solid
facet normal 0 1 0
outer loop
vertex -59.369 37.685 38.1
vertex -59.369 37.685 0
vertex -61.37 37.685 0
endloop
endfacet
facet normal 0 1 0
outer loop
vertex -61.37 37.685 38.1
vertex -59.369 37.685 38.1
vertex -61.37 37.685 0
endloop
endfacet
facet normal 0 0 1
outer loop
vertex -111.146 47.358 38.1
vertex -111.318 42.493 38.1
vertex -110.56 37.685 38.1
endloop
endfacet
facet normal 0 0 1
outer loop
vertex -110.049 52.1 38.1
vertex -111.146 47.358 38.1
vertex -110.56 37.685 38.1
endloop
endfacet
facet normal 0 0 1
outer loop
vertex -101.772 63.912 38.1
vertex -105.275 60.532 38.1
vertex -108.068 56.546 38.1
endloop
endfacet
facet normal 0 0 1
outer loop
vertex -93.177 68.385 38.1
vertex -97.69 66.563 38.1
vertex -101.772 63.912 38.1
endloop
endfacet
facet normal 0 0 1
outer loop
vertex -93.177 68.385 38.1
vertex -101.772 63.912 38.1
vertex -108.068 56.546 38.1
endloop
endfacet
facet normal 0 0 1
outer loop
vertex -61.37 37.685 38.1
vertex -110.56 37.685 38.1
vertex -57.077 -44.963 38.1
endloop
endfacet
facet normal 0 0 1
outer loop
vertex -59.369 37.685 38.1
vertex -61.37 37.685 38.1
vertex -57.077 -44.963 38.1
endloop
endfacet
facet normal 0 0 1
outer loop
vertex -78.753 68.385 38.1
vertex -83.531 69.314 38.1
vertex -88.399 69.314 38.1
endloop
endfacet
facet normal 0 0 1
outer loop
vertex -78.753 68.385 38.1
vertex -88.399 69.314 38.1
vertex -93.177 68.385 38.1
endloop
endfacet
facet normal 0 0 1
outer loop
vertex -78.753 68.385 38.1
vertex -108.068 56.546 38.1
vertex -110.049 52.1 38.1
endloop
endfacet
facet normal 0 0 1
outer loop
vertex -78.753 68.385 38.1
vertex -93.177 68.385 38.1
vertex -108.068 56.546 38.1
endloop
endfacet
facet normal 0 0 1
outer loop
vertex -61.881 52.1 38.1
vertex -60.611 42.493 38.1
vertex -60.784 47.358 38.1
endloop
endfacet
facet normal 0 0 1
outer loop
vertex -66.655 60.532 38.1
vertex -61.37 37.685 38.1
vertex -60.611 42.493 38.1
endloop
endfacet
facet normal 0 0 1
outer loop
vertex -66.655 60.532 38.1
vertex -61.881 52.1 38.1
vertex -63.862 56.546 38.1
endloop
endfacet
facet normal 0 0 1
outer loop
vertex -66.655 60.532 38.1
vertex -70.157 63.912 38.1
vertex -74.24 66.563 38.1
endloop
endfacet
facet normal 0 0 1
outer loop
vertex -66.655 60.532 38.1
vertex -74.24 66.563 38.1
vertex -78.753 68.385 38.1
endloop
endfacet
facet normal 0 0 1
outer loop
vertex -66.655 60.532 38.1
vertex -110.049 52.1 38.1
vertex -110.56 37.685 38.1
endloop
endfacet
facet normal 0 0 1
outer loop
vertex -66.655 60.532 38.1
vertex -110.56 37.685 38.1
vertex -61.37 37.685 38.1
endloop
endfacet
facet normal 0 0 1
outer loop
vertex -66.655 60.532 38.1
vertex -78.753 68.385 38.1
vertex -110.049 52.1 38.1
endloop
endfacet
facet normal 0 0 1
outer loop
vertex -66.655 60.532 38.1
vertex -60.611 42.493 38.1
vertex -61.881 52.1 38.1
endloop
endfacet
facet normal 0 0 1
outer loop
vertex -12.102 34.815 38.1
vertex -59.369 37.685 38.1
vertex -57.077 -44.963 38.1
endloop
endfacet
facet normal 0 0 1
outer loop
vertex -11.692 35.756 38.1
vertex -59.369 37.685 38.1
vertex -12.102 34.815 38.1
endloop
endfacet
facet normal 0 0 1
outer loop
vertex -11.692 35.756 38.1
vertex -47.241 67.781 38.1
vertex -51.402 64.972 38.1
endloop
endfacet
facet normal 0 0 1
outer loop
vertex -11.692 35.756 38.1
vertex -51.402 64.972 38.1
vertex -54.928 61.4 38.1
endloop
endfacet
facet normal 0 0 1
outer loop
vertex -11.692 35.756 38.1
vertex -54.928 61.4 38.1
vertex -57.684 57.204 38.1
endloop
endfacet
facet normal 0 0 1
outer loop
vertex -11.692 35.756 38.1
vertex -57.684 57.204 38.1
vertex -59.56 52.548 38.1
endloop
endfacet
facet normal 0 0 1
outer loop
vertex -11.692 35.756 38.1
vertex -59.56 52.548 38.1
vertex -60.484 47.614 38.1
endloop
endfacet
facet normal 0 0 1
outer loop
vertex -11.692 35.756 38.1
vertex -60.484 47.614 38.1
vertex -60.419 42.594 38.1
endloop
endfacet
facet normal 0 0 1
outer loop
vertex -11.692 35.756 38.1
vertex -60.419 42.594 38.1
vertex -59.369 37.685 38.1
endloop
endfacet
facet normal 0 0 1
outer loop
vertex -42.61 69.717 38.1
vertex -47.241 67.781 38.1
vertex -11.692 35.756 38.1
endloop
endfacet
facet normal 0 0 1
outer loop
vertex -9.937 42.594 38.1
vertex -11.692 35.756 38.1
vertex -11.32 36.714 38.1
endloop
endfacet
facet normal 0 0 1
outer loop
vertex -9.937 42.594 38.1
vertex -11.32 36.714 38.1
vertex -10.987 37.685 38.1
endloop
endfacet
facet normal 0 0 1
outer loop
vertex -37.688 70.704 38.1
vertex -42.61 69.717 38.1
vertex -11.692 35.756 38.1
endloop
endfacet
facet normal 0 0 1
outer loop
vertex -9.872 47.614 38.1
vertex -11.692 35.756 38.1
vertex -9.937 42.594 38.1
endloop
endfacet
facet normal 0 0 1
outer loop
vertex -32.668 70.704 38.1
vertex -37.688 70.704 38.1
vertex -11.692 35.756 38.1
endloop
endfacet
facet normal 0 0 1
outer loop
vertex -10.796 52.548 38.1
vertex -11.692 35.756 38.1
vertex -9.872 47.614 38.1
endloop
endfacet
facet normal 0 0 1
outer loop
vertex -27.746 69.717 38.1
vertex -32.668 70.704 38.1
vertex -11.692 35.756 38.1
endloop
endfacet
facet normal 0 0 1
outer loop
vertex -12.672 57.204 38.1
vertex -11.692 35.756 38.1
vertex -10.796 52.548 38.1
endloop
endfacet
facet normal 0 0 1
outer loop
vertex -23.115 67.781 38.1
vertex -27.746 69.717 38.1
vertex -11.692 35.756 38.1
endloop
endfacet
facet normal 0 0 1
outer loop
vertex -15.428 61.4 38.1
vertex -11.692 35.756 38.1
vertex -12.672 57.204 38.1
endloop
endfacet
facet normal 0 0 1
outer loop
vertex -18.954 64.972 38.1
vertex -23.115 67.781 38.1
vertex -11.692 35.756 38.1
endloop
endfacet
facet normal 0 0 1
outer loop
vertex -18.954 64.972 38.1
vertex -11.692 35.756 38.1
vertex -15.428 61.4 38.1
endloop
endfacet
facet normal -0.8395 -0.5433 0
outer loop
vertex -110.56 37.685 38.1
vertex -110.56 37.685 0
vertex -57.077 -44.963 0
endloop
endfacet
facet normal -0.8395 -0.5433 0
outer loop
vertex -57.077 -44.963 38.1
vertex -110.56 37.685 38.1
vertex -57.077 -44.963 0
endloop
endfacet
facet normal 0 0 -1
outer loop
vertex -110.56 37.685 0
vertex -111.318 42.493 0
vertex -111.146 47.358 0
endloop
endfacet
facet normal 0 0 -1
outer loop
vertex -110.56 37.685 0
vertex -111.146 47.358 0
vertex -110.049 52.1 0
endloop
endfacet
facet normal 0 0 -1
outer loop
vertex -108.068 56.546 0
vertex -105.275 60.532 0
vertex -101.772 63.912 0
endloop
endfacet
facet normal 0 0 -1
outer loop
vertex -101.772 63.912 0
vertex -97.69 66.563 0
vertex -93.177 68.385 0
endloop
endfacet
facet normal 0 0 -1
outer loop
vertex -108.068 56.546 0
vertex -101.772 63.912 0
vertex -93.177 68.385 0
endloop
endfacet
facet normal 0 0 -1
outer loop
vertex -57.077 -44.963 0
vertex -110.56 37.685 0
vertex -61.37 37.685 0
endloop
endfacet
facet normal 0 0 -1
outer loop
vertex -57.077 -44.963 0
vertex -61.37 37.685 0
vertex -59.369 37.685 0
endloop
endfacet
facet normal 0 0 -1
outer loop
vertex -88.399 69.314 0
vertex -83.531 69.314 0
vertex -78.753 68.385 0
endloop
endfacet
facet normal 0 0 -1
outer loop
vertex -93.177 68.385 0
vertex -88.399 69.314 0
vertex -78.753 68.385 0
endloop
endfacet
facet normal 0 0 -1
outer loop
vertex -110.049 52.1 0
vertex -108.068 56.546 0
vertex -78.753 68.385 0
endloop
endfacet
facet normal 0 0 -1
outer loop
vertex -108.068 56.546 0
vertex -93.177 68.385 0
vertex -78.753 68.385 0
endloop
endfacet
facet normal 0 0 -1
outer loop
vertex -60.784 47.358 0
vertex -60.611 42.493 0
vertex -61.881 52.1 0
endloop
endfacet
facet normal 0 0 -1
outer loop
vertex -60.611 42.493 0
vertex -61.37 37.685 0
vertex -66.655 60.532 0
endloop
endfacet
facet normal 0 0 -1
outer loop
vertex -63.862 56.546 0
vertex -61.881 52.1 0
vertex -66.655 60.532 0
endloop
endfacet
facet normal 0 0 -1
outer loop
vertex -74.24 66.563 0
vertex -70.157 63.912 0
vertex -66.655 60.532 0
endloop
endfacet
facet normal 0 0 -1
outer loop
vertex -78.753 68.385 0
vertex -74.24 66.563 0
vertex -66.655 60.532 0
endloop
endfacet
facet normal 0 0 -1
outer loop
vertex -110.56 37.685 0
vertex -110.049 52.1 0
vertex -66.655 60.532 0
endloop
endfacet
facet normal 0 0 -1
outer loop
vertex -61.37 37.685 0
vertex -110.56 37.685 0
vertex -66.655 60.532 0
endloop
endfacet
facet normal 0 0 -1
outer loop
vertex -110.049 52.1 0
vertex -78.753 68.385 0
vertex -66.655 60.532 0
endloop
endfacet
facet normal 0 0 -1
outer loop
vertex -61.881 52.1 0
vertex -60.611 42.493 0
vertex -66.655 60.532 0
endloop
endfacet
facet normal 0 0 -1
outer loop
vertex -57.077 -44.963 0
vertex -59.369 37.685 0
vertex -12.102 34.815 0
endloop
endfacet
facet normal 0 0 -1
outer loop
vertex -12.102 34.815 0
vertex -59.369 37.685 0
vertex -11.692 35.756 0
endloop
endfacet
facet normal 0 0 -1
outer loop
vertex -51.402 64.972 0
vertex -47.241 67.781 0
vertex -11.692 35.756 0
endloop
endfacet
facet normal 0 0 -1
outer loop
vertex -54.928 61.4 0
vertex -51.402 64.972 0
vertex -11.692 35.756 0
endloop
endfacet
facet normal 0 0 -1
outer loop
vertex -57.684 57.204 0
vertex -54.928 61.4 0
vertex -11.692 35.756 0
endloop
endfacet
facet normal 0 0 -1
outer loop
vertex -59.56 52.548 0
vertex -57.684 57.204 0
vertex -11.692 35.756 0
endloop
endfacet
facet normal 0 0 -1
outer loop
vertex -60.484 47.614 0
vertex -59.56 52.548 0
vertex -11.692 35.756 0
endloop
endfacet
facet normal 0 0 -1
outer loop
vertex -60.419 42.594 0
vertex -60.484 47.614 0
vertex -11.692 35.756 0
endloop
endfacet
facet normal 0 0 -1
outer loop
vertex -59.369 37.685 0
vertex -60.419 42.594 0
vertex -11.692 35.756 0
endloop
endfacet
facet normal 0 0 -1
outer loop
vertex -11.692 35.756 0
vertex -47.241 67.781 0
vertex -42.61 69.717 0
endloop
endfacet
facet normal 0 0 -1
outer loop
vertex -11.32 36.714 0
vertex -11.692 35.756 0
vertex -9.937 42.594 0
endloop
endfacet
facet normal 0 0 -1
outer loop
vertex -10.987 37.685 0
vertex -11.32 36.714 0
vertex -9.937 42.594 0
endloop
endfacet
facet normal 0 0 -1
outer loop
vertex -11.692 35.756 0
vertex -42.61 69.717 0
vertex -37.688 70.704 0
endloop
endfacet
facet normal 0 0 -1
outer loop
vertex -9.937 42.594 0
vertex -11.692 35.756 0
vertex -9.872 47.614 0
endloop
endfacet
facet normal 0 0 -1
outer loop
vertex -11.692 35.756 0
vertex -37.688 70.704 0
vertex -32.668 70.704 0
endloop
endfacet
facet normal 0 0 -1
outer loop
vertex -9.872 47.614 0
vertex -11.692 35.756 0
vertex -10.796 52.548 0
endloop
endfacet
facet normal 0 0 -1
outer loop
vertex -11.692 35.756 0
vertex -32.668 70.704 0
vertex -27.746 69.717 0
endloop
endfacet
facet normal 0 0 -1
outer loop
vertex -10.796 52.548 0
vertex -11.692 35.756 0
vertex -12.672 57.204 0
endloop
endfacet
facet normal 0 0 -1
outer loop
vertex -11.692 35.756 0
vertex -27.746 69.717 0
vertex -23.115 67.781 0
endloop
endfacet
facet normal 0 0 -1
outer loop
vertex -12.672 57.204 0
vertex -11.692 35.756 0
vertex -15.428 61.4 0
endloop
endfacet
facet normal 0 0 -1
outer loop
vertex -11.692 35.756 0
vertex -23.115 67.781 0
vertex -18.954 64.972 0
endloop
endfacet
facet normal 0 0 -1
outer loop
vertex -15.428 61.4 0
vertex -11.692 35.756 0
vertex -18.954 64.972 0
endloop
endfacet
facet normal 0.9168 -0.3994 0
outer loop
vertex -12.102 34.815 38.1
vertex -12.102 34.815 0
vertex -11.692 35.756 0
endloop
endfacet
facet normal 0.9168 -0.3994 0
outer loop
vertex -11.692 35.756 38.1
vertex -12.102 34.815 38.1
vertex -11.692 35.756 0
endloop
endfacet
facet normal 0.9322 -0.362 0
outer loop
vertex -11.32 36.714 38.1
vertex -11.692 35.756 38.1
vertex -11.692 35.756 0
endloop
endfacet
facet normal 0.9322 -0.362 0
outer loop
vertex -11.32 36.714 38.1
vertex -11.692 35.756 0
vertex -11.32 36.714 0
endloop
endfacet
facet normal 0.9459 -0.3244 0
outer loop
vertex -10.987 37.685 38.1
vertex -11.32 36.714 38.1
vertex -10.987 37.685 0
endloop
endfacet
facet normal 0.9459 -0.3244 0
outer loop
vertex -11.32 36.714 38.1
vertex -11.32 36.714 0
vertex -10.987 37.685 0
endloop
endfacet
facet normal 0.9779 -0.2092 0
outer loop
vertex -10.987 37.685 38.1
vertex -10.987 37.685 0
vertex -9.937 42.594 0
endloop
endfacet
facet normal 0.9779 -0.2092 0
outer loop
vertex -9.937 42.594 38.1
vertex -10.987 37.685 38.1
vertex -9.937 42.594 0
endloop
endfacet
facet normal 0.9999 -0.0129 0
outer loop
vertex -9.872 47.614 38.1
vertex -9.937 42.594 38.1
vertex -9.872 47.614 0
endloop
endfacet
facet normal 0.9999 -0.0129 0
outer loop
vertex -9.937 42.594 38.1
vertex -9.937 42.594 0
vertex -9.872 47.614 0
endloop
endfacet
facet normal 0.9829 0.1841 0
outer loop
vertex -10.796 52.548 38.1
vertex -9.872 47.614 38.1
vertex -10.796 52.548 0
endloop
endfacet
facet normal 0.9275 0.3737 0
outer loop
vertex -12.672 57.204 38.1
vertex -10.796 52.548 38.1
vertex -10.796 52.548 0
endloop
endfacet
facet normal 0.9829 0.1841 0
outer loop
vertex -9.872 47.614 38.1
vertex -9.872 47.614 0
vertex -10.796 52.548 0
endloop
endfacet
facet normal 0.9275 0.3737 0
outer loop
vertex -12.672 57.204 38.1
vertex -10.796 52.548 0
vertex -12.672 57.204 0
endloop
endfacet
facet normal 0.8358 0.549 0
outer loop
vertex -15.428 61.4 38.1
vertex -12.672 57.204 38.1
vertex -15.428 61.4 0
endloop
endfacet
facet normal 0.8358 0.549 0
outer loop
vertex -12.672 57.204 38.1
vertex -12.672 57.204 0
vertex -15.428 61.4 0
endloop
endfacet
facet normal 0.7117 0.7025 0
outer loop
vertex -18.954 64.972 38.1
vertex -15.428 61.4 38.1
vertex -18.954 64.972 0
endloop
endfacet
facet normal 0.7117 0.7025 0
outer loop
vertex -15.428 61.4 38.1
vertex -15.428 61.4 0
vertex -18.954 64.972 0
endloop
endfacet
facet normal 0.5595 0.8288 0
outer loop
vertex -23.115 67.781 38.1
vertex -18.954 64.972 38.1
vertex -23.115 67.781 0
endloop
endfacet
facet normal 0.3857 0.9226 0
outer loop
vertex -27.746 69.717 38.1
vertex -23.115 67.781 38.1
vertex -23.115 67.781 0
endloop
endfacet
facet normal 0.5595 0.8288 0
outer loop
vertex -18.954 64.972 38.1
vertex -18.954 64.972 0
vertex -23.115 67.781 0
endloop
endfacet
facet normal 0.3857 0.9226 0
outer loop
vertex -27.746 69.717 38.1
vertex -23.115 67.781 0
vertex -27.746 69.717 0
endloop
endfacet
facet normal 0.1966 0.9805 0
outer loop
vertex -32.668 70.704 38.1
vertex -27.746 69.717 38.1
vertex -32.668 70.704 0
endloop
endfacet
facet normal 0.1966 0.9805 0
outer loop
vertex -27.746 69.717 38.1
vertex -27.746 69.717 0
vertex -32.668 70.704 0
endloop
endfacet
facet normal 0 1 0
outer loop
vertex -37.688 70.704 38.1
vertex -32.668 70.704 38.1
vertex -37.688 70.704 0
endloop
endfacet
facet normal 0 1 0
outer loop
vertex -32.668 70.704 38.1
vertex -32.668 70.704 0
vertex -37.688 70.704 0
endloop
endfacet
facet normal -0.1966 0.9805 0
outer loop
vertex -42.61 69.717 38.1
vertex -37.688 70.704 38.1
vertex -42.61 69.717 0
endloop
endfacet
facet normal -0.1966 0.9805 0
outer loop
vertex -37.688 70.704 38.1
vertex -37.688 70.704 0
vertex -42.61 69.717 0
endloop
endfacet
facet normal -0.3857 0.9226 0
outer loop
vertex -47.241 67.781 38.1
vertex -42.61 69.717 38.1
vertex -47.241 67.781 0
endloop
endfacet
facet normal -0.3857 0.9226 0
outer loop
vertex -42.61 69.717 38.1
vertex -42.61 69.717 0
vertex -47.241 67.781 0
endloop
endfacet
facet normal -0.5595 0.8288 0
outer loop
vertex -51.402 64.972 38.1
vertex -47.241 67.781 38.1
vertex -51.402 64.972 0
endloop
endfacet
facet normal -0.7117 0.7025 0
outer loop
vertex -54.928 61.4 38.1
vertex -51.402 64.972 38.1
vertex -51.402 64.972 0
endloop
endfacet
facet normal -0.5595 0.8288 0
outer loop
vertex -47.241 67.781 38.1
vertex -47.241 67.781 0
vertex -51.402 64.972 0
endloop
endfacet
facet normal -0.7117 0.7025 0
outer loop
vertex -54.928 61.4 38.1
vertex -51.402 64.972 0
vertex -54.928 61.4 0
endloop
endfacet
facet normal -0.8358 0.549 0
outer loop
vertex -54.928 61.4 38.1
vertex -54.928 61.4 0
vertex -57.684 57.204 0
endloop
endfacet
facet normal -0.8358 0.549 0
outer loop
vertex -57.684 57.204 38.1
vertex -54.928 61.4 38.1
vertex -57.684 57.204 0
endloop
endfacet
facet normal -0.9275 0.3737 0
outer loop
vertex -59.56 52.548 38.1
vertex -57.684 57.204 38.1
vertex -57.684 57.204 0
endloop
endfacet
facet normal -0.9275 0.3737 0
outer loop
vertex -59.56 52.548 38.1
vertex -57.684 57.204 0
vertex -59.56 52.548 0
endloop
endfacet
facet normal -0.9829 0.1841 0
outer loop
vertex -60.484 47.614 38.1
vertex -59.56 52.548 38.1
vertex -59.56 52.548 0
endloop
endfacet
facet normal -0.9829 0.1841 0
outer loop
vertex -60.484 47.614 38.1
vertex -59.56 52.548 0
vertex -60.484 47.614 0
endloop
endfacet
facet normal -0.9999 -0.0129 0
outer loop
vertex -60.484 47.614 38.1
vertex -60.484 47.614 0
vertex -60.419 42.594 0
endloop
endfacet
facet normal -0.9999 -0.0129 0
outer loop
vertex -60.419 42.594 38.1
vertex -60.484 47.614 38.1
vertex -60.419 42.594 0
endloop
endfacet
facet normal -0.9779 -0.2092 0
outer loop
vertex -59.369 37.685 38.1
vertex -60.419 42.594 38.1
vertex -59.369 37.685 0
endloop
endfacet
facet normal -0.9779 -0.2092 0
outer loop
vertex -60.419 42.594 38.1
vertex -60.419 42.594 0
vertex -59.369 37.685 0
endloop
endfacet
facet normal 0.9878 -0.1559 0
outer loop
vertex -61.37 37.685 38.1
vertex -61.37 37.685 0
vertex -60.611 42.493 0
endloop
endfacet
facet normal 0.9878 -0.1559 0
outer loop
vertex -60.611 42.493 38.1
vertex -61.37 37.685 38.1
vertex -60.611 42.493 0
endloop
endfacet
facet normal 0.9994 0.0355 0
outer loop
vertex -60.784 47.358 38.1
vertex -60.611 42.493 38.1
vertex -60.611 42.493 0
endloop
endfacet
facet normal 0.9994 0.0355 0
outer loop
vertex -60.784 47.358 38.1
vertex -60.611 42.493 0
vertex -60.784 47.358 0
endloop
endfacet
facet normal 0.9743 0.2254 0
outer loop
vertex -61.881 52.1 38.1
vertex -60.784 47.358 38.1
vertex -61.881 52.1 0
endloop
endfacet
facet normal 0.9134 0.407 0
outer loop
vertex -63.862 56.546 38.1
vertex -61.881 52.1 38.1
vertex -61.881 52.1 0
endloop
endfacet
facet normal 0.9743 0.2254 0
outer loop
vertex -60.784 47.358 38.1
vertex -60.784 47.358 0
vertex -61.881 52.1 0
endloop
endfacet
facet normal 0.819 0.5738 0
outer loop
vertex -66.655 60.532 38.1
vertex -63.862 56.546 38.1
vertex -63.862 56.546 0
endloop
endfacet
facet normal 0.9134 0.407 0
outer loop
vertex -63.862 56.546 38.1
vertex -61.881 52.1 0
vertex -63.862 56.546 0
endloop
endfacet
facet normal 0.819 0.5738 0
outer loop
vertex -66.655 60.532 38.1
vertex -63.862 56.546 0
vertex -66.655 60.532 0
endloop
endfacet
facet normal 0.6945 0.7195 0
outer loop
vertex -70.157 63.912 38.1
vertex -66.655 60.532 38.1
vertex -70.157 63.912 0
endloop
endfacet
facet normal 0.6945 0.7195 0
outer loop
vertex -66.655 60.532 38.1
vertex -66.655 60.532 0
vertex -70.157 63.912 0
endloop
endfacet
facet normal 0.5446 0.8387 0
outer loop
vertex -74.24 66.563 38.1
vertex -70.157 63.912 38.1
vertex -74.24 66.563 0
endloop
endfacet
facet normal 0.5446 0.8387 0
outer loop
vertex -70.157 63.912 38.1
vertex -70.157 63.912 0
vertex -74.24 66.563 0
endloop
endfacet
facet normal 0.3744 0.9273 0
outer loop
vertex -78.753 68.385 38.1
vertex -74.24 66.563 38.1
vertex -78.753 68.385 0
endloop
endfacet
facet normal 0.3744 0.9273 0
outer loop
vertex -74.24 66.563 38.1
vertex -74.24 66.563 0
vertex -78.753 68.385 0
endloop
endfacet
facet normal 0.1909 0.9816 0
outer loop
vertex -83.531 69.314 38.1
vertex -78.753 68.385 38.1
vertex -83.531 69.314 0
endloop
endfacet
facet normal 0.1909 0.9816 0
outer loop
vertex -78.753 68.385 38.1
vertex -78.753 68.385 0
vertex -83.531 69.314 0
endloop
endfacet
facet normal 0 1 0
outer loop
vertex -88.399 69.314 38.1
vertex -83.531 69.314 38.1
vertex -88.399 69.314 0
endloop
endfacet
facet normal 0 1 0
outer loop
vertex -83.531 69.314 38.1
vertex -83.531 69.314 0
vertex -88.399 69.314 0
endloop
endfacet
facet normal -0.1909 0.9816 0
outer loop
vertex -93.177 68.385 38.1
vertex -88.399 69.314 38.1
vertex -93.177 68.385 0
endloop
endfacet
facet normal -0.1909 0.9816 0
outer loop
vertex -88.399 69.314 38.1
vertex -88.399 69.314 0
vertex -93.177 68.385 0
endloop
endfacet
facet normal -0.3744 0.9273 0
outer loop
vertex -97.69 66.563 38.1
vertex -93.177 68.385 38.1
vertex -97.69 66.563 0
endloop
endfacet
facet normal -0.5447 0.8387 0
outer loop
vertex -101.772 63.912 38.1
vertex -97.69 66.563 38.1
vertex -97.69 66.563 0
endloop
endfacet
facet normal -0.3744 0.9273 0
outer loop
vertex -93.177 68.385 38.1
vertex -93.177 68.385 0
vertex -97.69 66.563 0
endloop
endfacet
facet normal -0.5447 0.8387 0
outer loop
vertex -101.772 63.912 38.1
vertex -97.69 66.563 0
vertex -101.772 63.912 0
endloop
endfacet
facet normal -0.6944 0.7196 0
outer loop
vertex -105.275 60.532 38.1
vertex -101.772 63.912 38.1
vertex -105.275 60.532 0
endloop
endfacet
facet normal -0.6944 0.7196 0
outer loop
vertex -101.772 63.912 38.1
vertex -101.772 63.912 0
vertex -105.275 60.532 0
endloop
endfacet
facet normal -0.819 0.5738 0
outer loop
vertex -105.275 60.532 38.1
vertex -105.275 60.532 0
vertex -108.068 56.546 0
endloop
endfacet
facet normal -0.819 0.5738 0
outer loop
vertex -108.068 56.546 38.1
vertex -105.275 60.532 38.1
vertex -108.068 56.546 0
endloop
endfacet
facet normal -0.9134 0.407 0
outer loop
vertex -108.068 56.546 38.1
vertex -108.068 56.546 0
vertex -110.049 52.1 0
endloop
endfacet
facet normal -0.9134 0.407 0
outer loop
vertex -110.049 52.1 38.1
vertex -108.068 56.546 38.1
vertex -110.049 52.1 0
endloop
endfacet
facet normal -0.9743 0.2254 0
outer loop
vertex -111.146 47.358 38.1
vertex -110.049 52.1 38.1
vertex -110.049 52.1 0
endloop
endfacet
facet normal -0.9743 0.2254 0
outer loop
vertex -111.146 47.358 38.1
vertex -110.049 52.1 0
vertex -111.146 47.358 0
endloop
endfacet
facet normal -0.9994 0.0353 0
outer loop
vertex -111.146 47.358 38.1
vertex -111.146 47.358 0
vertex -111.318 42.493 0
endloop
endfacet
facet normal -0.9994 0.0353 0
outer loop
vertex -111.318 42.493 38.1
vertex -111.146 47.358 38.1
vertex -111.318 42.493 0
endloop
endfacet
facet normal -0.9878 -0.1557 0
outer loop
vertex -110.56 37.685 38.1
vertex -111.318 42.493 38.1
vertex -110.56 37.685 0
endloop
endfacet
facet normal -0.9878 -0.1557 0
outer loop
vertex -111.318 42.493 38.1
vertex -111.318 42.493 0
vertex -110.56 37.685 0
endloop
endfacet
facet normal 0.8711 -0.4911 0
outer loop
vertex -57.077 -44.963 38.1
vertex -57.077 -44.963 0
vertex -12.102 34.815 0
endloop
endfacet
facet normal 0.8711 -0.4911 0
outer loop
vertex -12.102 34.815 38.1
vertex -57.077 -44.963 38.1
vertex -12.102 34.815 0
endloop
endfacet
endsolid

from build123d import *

# Parameters (mm, degrees)
F1_DEPTH = 38.1


with BuildPart() as f1:
    # F0 (on Top) → F1 (new body)
    with BuildSketch(Plane.XY):
        with BuildLine():
            Line((-59.369042, 37.685493), (-61.37024, 37.685493))
            ThreePointArc((-61.37024, 37.685493), (-85.964896, 69.4308), (-110.559551, 37.685493))
            Line((-110.559551, 37.685493), (-57.076961, -44.962659))
            Line((-57.076961, -44.962659), (-12.102065, 34.814507))
            ThreePointArc((-12.102065, 34.814507), (-11.501003, 36.233084), (-10.987052, 37.685493))
            ThreePointArc((-10.987052, 37.685493), (-35.178047, 70.828604), (-59.369042, 37.685493))
        make_face()
    extrude(amount=F1_DEPTH)


solid = f1.part
